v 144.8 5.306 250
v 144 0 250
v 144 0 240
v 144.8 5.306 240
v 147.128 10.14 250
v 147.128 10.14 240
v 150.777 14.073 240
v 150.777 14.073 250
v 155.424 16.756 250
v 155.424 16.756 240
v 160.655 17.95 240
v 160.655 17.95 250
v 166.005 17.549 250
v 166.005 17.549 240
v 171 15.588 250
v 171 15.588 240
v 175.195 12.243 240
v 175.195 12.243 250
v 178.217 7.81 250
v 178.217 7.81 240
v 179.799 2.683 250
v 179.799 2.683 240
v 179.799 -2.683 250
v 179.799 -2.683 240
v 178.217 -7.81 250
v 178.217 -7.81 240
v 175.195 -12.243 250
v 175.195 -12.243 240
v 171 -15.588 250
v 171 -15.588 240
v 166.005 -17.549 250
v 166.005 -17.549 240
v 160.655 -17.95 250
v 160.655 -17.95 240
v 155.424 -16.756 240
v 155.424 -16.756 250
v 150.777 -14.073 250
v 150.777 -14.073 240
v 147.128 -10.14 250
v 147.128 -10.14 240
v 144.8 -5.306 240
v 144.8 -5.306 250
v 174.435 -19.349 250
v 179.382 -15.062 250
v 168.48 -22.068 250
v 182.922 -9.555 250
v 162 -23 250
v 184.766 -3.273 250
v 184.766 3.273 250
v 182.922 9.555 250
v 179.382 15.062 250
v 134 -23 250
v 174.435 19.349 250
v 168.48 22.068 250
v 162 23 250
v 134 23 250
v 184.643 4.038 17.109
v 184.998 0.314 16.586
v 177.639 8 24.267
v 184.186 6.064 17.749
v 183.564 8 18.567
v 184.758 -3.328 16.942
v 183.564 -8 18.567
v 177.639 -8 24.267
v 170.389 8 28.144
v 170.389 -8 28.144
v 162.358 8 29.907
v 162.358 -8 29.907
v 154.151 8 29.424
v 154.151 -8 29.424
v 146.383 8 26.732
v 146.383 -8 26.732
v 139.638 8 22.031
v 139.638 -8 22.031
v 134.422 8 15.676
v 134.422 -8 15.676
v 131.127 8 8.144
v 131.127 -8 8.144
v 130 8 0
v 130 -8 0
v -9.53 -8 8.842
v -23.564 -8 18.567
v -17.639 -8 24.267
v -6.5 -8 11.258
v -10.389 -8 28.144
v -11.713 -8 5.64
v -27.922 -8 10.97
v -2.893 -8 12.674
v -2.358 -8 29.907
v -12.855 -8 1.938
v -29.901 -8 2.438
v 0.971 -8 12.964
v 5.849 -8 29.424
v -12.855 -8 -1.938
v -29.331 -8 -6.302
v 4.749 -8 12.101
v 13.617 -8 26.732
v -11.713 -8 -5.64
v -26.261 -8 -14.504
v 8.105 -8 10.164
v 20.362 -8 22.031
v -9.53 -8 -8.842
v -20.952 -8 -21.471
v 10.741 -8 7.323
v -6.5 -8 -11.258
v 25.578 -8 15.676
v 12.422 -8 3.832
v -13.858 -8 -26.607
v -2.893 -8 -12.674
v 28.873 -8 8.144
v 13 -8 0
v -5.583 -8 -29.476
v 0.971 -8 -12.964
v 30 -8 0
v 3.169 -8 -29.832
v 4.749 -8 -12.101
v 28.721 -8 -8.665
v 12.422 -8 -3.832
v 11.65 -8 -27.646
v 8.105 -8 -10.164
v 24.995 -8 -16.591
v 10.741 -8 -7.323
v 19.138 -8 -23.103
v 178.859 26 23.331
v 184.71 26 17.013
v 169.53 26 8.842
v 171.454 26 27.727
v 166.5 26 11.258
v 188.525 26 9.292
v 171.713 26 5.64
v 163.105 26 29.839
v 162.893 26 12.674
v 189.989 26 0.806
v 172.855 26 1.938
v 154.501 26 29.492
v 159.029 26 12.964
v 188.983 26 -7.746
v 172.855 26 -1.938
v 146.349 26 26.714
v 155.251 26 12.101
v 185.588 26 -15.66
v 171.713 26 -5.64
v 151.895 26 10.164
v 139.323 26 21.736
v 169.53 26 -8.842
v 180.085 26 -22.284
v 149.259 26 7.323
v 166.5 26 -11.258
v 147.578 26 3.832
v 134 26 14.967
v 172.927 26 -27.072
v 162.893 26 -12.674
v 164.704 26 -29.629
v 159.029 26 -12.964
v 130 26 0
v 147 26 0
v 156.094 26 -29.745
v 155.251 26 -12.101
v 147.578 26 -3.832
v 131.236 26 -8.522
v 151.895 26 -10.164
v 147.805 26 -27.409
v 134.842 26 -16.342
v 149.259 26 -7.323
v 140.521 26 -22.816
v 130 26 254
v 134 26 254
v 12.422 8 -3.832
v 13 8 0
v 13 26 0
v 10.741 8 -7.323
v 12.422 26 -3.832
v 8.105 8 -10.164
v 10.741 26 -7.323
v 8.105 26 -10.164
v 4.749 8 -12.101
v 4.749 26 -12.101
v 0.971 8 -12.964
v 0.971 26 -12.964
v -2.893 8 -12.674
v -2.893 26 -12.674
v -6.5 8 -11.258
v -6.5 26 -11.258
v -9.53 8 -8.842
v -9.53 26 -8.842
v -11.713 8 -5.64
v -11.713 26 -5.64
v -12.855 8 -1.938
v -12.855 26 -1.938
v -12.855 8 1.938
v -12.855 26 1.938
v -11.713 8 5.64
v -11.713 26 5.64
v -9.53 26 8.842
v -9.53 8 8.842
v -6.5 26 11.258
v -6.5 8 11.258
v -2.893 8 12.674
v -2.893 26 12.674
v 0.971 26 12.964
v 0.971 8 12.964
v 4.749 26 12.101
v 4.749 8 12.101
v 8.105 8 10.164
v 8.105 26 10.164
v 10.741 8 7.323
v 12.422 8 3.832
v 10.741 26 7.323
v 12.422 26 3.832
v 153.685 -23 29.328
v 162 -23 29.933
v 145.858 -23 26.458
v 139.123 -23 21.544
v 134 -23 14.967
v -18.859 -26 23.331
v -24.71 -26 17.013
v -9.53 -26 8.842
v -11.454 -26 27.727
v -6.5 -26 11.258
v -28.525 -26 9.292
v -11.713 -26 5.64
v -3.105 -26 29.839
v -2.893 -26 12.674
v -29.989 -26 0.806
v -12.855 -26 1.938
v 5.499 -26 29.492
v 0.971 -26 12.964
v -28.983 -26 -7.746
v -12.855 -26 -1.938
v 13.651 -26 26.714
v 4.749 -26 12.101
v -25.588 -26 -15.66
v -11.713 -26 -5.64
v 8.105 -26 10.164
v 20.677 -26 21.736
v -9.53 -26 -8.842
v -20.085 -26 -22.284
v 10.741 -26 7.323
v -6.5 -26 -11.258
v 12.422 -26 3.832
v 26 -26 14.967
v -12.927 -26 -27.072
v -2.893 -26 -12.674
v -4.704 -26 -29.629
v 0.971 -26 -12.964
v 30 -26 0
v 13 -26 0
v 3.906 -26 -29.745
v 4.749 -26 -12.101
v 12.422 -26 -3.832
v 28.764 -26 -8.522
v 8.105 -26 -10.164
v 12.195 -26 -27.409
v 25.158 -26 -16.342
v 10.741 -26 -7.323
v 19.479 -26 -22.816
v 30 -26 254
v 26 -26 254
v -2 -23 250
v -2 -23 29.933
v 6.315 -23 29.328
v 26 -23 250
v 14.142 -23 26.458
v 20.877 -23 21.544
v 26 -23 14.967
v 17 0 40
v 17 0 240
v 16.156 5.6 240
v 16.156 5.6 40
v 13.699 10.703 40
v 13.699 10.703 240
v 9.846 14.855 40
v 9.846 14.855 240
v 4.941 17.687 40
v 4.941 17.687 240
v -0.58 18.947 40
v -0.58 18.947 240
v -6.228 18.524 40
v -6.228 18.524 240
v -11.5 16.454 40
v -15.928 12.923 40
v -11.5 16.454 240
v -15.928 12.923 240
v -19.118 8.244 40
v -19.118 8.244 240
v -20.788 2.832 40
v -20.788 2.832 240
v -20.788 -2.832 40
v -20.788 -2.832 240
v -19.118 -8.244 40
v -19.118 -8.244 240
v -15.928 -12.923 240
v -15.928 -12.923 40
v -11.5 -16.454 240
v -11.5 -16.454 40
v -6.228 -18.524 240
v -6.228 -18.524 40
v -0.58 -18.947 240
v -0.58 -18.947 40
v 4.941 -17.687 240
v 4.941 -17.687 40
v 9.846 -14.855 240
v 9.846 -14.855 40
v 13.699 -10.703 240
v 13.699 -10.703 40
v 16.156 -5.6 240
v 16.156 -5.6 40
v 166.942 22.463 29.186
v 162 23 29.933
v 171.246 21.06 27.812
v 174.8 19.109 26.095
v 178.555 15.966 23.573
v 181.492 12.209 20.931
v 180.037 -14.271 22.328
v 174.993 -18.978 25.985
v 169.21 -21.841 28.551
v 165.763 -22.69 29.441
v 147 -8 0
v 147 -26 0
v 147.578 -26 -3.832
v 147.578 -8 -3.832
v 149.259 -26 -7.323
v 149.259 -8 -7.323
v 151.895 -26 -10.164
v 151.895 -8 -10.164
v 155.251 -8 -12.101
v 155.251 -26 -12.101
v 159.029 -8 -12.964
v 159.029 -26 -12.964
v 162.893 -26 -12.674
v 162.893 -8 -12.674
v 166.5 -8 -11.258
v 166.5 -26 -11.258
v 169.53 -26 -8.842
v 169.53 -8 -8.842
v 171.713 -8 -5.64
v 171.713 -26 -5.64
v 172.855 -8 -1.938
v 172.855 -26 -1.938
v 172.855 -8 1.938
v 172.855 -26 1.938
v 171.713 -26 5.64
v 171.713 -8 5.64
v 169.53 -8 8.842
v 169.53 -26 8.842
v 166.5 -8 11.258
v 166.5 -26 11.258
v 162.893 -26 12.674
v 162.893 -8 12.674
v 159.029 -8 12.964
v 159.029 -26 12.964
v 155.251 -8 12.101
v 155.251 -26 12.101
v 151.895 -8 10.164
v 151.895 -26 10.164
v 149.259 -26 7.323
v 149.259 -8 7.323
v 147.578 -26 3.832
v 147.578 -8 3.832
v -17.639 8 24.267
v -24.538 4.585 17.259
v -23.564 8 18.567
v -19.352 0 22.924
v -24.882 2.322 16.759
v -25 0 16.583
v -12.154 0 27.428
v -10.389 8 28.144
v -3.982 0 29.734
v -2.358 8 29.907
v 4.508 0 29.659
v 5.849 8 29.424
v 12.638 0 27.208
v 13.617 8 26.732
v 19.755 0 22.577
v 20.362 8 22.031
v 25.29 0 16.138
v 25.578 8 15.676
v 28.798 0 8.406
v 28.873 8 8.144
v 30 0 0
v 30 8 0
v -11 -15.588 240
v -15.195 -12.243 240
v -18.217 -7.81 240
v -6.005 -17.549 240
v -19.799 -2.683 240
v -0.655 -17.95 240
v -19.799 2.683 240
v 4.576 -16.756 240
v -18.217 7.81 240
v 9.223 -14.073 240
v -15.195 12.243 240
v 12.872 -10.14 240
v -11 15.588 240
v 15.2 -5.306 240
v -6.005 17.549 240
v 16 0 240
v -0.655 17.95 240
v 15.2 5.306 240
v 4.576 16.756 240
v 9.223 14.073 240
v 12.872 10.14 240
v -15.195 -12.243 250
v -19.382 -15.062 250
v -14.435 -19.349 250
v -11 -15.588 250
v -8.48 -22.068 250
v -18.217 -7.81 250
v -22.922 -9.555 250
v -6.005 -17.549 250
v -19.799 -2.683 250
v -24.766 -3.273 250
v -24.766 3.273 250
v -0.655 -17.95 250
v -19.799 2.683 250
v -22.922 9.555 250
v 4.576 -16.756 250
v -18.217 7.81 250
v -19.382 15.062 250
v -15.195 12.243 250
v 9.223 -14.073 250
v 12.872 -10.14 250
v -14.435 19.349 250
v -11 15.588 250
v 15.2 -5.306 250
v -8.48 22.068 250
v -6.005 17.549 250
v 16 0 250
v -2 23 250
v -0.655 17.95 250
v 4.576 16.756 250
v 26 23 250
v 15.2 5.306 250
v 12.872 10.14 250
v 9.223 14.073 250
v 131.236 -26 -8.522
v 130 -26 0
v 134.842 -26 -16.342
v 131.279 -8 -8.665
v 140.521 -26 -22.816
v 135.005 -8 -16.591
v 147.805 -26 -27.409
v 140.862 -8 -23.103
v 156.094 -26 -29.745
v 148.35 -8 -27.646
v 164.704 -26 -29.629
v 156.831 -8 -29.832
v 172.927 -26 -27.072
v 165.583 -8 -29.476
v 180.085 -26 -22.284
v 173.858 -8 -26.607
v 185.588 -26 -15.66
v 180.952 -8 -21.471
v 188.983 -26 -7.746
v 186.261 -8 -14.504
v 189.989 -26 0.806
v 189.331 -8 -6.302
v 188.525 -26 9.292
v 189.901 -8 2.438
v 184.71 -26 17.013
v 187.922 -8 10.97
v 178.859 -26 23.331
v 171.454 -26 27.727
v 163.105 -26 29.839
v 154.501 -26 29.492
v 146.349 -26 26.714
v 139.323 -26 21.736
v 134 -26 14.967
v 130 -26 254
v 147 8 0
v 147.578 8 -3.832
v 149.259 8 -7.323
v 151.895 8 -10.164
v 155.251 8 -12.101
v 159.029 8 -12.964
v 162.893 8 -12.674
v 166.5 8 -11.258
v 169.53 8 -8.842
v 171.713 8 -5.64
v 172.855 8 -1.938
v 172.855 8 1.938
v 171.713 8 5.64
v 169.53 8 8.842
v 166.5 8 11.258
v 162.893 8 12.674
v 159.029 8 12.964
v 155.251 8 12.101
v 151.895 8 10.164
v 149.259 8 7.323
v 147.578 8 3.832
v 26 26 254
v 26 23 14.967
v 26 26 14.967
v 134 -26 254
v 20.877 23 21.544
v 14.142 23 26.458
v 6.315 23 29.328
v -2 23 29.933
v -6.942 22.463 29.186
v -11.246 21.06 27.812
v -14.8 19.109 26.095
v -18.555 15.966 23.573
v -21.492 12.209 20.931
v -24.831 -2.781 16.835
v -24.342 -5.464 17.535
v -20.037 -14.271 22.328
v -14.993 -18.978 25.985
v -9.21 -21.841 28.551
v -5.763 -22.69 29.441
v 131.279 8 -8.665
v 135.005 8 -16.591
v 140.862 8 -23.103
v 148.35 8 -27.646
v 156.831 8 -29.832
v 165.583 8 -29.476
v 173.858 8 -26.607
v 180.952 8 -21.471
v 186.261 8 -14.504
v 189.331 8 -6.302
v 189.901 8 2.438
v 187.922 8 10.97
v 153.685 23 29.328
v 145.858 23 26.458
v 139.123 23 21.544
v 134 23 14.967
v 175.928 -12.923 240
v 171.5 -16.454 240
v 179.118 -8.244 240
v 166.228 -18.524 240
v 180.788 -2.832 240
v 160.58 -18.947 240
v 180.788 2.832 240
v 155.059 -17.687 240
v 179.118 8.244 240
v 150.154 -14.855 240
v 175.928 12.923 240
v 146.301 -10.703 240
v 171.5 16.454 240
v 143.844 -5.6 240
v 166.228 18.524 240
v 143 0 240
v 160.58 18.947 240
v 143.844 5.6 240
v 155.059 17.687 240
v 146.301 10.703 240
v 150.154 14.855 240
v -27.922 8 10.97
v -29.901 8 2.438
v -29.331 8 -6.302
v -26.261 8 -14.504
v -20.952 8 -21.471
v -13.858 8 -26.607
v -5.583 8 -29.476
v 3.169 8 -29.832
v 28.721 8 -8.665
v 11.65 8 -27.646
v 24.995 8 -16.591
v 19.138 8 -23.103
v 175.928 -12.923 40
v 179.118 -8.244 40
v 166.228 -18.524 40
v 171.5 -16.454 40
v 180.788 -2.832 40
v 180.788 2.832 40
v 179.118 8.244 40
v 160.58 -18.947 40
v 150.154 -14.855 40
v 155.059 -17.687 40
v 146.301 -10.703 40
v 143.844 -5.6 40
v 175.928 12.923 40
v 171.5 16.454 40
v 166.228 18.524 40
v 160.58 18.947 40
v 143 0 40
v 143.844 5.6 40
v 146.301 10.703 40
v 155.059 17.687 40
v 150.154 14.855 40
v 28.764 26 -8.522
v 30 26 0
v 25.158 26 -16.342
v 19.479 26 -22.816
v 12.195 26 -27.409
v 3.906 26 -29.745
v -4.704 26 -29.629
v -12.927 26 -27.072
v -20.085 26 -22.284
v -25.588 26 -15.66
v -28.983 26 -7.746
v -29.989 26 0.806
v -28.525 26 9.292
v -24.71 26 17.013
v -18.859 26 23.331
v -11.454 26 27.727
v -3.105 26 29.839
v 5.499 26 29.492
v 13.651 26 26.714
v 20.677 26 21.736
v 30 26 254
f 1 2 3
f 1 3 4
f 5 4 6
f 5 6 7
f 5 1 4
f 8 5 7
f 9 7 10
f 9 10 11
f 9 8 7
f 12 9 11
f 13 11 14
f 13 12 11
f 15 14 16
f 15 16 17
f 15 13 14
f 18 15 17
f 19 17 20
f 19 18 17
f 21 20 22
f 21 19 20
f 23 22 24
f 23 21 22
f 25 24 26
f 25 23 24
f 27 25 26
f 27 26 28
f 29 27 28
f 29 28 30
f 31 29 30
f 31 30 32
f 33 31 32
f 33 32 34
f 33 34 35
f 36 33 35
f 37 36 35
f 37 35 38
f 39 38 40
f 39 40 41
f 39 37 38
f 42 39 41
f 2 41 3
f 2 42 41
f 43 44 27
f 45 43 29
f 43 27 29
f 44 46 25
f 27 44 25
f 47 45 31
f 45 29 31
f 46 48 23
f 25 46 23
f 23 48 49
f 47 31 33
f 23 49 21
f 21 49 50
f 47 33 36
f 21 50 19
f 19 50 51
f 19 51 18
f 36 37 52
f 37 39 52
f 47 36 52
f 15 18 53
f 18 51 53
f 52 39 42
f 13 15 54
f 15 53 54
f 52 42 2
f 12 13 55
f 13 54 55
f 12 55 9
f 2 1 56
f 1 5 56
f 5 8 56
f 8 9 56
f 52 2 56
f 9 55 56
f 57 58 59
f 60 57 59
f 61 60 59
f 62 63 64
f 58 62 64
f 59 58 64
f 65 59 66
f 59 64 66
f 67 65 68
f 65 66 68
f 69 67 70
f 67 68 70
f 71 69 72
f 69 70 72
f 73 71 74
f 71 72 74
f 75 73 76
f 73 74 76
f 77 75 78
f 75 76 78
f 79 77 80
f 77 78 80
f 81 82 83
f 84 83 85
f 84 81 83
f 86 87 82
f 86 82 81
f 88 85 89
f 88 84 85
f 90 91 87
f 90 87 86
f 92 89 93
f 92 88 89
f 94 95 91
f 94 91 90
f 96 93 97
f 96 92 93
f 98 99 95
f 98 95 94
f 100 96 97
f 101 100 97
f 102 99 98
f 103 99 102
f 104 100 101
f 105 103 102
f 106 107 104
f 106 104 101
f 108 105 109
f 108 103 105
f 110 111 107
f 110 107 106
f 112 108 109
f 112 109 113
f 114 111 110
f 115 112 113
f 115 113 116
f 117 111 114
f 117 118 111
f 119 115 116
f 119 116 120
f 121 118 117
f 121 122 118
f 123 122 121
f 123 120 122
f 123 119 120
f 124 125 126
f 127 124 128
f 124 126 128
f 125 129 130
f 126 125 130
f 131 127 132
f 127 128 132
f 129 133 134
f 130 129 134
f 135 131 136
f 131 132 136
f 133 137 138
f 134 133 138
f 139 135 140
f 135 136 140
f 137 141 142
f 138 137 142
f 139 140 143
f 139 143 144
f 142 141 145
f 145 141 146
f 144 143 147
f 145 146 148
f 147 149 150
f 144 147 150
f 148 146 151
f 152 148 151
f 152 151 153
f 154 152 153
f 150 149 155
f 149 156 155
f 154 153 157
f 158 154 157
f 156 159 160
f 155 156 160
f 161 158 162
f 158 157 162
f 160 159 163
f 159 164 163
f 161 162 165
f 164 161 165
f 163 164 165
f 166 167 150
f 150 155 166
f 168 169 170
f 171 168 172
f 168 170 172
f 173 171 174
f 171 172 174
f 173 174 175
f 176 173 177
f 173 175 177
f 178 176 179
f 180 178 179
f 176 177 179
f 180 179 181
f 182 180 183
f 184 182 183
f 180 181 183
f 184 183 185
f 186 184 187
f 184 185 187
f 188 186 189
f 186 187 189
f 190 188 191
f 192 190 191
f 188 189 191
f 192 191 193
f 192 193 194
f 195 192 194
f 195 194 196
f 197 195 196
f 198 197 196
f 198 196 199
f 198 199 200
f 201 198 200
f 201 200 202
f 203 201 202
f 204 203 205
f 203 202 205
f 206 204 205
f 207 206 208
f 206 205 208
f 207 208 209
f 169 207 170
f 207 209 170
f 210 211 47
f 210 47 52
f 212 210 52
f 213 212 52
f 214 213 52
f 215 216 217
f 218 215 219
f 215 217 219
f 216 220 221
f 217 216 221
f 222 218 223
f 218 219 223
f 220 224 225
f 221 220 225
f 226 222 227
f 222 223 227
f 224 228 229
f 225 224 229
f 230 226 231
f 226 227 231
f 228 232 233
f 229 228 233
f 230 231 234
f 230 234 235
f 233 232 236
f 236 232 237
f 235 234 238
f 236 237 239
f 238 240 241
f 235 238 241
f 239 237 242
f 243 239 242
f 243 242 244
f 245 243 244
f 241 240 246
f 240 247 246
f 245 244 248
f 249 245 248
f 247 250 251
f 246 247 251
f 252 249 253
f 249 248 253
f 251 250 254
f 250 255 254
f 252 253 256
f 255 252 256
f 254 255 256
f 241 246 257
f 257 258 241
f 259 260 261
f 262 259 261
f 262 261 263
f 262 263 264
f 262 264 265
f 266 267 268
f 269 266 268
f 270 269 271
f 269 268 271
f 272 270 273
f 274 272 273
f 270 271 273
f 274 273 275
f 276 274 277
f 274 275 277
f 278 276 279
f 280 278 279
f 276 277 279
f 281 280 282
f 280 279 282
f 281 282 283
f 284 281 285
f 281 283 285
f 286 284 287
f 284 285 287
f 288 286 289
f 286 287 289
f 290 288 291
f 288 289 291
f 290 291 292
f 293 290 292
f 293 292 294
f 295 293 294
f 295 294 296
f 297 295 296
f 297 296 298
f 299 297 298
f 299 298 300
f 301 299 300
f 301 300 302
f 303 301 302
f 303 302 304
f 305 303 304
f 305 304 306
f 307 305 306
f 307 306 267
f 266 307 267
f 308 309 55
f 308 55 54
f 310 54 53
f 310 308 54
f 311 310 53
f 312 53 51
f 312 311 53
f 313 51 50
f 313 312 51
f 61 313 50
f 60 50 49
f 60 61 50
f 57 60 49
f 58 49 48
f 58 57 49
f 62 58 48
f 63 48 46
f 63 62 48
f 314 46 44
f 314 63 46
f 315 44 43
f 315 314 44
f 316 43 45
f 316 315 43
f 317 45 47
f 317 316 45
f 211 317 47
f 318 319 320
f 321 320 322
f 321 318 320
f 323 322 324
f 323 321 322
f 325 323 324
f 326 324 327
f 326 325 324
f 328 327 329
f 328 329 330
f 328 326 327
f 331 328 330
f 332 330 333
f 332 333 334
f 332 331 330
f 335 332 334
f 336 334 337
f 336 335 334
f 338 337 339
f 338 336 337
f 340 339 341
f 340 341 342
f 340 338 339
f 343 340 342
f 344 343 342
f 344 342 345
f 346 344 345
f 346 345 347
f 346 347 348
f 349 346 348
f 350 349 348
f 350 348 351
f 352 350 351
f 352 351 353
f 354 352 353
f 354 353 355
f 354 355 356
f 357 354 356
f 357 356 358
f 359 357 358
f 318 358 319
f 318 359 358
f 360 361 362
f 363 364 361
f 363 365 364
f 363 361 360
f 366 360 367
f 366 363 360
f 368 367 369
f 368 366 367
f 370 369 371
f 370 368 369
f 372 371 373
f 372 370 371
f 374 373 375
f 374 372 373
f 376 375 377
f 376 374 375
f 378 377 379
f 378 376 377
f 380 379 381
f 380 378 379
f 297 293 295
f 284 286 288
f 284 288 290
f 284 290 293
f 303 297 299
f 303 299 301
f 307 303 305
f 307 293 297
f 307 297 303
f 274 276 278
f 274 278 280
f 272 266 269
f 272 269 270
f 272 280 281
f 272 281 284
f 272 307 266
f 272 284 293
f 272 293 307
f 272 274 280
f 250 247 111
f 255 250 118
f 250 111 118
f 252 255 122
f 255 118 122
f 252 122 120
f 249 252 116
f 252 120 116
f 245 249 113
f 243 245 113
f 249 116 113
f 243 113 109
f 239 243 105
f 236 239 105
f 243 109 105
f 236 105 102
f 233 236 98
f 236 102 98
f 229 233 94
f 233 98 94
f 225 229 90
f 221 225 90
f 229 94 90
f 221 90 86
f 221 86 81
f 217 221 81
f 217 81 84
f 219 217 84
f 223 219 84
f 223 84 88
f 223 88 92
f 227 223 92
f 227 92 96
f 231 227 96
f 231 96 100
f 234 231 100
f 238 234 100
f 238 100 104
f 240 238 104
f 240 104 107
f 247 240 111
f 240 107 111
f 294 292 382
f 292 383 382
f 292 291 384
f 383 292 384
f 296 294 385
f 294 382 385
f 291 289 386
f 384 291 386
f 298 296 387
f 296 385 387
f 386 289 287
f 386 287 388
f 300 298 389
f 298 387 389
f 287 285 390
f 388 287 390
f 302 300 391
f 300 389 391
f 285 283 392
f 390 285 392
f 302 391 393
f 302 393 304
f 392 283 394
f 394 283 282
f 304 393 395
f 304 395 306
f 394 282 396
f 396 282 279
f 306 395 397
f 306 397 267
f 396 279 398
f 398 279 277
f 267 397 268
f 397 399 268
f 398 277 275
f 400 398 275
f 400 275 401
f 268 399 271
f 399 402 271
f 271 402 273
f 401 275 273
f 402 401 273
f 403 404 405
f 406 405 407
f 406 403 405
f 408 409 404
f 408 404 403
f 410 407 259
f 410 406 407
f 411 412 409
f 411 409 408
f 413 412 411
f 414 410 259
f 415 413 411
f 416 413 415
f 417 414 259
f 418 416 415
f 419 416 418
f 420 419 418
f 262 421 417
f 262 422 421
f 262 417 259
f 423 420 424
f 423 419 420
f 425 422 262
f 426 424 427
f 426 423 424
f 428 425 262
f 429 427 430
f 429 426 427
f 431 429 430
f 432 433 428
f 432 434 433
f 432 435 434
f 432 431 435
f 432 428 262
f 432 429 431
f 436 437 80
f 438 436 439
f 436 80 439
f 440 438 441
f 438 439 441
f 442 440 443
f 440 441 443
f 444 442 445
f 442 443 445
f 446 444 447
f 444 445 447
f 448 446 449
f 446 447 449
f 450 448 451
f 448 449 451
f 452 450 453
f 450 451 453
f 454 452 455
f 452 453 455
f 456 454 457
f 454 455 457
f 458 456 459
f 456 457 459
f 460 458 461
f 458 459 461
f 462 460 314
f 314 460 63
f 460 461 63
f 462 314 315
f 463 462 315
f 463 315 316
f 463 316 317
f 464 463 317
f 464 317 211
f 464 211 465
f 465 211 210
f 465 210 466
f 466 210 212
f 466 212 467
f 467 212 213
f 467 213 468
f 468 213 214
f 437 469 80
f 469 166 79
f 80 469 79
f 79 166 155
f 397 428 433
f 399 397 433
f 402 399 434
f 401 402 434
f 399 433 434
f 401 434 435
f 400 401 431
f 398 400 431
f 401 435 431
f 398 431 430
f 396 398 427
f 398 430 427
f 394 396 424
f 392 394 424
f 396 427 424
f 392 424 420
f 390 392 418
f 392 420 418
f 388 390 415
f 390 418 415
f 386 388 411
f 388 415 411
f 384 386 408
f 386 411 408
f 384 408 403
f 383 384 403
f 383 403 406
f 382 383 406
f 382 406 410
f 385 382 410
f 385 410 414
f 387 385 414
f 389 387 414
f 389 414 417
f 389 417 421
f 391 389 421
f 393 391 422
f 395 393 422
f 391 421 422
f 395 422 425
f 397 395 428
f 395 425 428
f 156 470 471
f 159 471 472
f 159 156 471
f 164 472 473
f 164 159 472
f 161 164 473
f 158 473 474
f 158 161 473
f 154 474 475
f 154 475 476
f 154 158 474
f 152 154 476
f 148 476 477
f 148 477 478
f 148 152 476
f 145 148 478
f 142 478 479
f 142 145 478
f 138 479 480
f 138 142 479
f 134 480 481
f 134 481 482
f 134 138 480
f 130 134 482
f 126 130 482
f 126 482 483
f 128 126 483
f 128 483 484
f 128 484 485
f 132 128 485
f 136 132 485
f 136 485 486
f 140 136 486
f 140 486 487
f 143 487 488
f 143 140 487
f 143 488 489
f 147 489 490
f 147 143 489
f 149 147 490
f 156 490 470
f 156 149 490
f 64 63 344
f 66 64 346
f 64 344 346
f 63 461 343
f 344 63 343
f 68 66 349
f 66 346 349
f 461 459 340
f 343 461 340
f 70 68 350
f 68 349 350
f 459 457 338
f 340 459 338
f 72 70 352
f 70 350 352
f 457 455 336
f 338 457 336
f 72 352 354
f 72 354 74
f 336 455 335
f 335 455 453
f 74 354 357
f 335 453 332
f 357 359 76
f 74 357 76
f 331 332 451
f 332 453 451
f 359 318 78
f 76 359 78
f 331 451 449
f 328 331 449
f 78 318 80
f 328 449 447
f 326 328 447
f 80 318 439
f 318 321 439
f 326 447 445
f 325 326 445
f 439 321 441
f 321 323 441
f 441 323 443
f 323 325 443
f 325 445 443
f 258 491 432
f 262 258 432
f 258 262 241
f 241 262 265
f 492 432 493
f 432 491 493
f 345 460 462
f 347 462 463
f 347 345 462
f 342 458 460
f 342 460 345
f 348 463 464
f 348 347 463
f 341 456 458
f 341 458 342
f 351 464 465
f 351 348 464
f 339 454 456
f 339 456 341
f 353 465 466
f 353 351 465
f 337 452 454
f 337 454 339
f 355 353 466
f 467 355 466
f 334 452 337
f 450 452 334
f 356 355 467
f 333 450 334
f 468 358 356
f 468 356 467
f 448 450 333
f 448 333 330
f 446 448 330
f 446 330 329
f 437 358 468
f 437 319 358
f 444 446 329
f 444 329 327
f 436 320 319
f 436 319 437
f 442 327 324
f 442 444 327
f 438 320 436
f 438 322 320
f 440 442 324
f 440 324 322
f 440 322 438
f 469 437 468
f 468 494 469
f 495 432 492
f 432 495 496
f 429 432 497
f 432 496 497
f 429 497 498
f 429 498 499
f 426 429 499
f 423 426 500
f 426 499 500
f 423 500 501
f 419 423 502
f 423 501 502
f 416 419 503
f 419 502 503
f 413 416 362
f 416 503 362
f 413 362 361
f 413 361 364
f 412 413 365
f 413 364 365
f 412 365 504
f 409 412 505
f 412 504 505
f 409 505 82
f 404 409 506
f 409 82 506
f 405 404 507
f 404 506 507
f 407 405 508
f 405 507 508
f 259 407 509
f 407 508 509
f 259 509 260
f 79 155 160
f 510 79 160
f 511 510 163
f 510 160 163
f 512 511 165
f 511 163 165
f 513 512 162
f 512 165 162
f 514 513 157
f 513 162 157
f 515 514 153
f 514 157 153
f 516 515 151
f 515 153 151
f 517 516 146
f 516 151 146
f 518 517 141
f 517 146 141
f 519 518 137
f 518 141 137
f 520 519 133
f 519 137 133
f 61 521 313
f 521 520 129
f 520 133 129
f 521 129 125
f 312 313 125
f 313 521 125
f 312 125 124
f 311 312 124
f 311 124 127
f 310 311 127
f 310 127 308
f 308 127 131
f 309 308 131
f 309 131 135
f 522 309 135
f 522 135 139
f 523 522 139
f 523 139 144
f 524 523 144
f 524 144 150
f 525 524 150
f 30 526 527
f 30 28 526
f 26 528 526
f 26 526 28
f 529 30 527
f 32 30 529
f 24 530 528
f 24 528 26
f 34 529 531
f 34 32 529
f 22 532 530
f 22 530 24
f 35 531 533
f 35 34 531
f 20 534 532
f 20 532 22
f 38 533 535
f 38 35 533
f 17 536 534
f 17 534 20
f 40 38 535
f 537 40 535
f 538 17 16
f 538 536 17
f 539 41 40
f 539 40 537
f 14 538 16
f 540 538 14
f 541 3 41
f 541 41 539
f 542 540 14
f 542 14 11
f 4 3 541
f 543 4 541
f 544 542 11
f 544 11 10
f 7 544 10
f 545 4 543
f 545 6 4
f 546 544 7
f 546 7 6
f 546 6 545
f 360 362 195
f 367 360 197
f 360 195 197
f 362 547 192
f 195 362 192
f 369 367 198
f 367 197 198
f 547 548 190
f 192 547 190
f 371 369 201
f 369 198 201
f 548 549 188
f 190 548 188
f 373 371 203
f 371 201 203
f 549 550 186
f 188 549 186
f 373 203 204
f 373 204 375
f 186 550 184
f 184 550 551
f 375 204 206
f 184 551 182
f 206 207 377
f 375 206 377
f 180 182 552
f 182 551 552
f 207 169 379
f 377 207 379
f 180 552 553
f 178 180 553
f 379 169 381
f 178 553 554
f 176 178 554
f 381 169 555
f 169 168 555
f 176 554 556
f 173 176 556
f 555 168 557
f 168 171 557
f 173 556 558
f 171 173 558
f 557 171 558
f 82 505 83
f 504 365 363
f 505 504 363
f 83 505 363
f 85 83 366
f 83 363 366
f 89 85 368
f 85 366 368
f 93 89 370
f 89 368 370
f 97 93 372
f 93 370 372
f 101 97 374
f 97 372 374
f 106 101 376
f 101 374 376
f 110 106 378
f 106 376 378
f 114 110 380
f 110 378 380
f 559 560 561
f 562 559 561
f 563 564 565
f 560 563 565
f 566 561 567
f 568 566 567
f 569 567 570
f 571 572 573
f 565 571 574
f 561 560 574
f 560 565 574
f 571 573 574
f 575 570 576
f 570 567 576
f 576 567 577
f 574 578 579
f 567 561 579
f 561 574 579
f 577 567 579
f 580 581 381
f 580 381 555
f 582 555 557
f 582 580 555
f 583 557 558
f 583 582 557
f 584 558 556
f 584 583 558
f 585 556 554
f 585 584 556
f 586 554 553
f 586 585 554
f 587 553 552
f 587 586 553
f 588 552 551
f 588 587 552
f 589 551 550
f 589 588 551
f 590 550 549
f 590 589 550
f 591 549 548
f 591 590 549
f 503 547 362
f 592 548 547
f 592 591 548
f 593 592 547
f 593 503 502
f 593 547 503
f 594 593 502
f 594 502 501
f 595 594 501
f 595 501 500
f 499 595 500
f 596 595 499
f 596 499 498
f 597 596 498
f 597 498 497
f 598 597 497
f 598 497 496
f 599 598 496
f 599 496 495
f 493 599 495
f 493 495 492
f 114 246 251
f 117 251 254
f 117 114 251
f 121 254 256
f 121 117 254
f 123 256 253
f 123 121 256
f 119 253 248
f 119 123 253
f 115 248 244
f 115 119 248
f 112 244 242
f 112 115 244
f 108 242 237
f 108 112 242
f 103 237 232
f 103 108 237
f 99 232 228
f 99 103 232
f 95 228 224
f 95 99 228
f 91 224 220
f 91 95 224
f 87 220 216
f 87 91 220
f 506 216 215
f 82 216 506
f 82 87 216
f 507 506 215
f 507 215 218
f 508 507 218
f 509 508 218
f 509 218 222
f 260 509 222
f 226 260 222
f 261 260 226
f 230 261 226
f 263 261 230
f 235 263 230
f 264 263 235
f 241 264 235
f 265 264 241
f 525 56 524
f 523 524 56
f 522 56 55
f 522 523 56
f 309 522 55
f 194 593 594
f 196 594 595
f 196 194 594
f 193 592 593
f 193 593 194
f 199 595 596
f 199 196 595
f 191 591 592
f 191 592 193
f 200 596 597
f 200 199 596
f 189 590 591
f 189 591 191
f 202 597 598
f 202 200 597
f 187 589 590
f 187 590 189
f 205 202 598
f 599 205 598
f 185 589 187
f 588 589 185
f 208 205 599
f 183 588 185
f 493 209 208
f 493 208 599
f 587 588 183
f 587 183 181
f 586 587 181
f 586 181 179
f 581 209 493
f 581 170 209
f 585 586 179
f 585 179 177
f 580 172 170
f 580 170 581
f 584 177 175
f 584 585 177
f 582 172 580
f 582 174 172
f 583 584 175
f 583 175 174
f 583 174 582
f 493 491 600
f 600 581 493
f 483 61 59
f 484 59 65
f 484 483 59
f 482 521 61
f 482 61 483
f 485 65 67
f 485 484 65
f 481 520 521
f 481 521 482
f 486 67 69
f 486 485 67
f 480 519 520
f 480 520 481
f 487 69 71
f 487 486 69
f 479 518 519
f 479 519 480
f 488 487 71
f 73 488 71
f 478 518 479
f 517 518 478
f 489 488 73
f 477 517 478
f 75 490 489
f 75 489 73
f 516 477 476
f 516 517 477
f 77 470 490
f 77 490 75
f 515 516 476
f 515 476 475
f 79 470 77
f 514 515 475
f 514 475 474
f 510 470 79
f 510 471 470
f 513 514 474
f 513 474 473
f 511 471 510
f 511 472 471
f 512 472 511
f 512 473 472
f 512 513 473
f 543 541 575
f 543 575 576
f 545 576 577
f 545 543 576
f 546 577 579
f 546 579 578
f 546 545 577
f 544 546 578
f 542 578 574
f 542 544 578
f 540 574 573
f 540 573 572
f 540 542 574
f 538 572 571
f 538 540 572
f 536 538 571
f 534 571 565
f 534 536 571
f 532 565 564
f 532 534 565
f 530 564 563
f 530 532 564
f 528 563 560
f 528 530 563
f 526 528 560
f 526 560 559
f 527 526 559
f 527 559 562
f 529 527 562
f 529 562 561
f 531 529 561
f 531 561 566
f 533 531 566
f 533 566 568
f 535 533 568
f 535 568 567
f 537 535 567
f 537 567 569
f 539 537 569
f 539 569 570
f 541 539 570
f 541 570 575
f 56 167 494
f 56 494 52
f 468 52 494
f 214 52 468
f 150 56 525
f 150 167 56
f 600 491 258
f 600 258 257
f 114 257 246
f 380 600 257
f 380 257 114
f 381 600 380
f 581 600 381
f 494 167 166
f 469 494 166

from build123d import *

# Parameters (mm, degrees)
SKETCH1_R           = 30
BOSS_EXTRUDE1_DEPTH = 26
BOSS_EXTRUDE2_DEPTH = 250
SKETCH4_R           = 13
CUT_EXTRUDE2_DEPTH  = 26
SKETCH1_2_R         = 30
CUT_EXTRUDE3_DEPTH  = 8
CUT_EXTRUDE4_START  = 8
SKETCH1_3_R         = 30
CUT_EXTRUDE4_DEPTH  = 8
SKETCH5_R           = 19
CUT_EXTRUDE5_DEPTH  = 210
SKETCH7_W           = 4
SKETCH7_H           = 4
BOSS_EXTRUDE4_DEPTH = 26
SKETCH9_R           = 19
SKETCH9_R_2         = 18
BOSS_EXTRUDE5_DEPTH = 10


with BuildPart() as part:
    # Sketch1 → Boss-Extrude1 (new, symmetric)
    with BuildSketch(Plane(origin=(0, 0, 0), x_dir=(1, 0, 0), z_dir=(0, 1, 0))):
        Circle(SKETCH1_R)
    extrude(amount=BOSS_EXTRUDE1_DEPTH, both=True)

    # Sketch3 → Boss-Extrude2 (add)
    with BuildSketch(Plane.XY):
        with BuildLine():
            Line((26, 26), (26, 23))
            Line((26, 23), (-2, 23))
            ThreePointArc((-2, 23), (-25, 0), (-2, -23))
            Line((-2, -23), (26, -23))
            Line((26, -23), (26, -26))
            Line((26, -26), (30, -26))
            Line((30, -26), (30, 26))
            Line((30, 26), (26, 26))
        make_face()
    extrude(amount=BOSS_EXTRUDE2_DEPTH)

    # Sketch4 → Cut-Extrude2 (cut, symmetric)
    with BuildSketch(Plane(origin=(0, 0, 0), x_dir=(1, 0, 0), z_dir=(0, 1, 0))):
        Circle(SKETCH4_R)
    extrude(amount=CUT_EXTRUDE2_DEPTH, both=True, mode=Mode.SUBTRACT)

    # Sketch1<2> → Cut-Extrude3 (cut)
    with BuildSketch(Plane(origin=(0, 0, 0), x_dir=(1, 0, 0), z_dir=(0, 1, 0))):
        Circle(SKETCH1_2_R)
    extrude(amount=-CUT_EXTRUDE3_DEPTH, mode=Mode.SUBTRACT)

    # Sketch1<3> → Cut-Extrude4 (cut)
    with BuildSketch(Plane(origin=(0, 0, 0), x_dir=(1, 0, 0), z_dir=(0, 1, 0)).offset(CUT_EXTRUDE4_START)):
        Circle(SKETCH1_3_R)
    extrude(amount=-CUT_EXTRUDE4_DEPTH, mode=Mode.SUBTRACT)

    # Sketch5 → Cut-Extrude5 (cut)
    with BuildSketch(Plane.XY.offset(250)):
        with Locations((-2, 0)):
            Circle(SKETCH5_R)
    extrude(amount=-CUT_EXTRUDE5_DEPTH, mode=Mode.SUBTRACT)

    # Sketch7 → Boss-Extrude4 (add, symmetric)
    with BuildSketch(Plane(origin=(0, 0, 0), x_dir=(1, 0, 0), z_dir=(0, 1, 0))):
        with Locations((28, -252)):
            Rectangle(SKETCH7_W, SKETCH7_H)
    extrude(amount=BOSS_EXTRUDE4_DEPTH, both=True)

    # Sketch9 → Boss-Extrude5 (add)
    with BuildSketch(Plane.XY.offset(250)):
        with Locations((-2, 0)):
            Circle(SKETCH9_R)
        with Locations((-2, 0)):
            Circle(SKETCH9_R_2, mode=Mode.SUBTRACT)
    extrude(amount=-BOSS_EXTRUDE5_DEPTH)


with BuildPart() as body_2:
    # Mirror2: mirrored copy
    add(part.part.mirror(Plane(origin=(80, 0, 0), x_dir=(0, 0, 1), z_dir=(1, 0, 0))))


solid = Compound([part.part, body_2.part])
